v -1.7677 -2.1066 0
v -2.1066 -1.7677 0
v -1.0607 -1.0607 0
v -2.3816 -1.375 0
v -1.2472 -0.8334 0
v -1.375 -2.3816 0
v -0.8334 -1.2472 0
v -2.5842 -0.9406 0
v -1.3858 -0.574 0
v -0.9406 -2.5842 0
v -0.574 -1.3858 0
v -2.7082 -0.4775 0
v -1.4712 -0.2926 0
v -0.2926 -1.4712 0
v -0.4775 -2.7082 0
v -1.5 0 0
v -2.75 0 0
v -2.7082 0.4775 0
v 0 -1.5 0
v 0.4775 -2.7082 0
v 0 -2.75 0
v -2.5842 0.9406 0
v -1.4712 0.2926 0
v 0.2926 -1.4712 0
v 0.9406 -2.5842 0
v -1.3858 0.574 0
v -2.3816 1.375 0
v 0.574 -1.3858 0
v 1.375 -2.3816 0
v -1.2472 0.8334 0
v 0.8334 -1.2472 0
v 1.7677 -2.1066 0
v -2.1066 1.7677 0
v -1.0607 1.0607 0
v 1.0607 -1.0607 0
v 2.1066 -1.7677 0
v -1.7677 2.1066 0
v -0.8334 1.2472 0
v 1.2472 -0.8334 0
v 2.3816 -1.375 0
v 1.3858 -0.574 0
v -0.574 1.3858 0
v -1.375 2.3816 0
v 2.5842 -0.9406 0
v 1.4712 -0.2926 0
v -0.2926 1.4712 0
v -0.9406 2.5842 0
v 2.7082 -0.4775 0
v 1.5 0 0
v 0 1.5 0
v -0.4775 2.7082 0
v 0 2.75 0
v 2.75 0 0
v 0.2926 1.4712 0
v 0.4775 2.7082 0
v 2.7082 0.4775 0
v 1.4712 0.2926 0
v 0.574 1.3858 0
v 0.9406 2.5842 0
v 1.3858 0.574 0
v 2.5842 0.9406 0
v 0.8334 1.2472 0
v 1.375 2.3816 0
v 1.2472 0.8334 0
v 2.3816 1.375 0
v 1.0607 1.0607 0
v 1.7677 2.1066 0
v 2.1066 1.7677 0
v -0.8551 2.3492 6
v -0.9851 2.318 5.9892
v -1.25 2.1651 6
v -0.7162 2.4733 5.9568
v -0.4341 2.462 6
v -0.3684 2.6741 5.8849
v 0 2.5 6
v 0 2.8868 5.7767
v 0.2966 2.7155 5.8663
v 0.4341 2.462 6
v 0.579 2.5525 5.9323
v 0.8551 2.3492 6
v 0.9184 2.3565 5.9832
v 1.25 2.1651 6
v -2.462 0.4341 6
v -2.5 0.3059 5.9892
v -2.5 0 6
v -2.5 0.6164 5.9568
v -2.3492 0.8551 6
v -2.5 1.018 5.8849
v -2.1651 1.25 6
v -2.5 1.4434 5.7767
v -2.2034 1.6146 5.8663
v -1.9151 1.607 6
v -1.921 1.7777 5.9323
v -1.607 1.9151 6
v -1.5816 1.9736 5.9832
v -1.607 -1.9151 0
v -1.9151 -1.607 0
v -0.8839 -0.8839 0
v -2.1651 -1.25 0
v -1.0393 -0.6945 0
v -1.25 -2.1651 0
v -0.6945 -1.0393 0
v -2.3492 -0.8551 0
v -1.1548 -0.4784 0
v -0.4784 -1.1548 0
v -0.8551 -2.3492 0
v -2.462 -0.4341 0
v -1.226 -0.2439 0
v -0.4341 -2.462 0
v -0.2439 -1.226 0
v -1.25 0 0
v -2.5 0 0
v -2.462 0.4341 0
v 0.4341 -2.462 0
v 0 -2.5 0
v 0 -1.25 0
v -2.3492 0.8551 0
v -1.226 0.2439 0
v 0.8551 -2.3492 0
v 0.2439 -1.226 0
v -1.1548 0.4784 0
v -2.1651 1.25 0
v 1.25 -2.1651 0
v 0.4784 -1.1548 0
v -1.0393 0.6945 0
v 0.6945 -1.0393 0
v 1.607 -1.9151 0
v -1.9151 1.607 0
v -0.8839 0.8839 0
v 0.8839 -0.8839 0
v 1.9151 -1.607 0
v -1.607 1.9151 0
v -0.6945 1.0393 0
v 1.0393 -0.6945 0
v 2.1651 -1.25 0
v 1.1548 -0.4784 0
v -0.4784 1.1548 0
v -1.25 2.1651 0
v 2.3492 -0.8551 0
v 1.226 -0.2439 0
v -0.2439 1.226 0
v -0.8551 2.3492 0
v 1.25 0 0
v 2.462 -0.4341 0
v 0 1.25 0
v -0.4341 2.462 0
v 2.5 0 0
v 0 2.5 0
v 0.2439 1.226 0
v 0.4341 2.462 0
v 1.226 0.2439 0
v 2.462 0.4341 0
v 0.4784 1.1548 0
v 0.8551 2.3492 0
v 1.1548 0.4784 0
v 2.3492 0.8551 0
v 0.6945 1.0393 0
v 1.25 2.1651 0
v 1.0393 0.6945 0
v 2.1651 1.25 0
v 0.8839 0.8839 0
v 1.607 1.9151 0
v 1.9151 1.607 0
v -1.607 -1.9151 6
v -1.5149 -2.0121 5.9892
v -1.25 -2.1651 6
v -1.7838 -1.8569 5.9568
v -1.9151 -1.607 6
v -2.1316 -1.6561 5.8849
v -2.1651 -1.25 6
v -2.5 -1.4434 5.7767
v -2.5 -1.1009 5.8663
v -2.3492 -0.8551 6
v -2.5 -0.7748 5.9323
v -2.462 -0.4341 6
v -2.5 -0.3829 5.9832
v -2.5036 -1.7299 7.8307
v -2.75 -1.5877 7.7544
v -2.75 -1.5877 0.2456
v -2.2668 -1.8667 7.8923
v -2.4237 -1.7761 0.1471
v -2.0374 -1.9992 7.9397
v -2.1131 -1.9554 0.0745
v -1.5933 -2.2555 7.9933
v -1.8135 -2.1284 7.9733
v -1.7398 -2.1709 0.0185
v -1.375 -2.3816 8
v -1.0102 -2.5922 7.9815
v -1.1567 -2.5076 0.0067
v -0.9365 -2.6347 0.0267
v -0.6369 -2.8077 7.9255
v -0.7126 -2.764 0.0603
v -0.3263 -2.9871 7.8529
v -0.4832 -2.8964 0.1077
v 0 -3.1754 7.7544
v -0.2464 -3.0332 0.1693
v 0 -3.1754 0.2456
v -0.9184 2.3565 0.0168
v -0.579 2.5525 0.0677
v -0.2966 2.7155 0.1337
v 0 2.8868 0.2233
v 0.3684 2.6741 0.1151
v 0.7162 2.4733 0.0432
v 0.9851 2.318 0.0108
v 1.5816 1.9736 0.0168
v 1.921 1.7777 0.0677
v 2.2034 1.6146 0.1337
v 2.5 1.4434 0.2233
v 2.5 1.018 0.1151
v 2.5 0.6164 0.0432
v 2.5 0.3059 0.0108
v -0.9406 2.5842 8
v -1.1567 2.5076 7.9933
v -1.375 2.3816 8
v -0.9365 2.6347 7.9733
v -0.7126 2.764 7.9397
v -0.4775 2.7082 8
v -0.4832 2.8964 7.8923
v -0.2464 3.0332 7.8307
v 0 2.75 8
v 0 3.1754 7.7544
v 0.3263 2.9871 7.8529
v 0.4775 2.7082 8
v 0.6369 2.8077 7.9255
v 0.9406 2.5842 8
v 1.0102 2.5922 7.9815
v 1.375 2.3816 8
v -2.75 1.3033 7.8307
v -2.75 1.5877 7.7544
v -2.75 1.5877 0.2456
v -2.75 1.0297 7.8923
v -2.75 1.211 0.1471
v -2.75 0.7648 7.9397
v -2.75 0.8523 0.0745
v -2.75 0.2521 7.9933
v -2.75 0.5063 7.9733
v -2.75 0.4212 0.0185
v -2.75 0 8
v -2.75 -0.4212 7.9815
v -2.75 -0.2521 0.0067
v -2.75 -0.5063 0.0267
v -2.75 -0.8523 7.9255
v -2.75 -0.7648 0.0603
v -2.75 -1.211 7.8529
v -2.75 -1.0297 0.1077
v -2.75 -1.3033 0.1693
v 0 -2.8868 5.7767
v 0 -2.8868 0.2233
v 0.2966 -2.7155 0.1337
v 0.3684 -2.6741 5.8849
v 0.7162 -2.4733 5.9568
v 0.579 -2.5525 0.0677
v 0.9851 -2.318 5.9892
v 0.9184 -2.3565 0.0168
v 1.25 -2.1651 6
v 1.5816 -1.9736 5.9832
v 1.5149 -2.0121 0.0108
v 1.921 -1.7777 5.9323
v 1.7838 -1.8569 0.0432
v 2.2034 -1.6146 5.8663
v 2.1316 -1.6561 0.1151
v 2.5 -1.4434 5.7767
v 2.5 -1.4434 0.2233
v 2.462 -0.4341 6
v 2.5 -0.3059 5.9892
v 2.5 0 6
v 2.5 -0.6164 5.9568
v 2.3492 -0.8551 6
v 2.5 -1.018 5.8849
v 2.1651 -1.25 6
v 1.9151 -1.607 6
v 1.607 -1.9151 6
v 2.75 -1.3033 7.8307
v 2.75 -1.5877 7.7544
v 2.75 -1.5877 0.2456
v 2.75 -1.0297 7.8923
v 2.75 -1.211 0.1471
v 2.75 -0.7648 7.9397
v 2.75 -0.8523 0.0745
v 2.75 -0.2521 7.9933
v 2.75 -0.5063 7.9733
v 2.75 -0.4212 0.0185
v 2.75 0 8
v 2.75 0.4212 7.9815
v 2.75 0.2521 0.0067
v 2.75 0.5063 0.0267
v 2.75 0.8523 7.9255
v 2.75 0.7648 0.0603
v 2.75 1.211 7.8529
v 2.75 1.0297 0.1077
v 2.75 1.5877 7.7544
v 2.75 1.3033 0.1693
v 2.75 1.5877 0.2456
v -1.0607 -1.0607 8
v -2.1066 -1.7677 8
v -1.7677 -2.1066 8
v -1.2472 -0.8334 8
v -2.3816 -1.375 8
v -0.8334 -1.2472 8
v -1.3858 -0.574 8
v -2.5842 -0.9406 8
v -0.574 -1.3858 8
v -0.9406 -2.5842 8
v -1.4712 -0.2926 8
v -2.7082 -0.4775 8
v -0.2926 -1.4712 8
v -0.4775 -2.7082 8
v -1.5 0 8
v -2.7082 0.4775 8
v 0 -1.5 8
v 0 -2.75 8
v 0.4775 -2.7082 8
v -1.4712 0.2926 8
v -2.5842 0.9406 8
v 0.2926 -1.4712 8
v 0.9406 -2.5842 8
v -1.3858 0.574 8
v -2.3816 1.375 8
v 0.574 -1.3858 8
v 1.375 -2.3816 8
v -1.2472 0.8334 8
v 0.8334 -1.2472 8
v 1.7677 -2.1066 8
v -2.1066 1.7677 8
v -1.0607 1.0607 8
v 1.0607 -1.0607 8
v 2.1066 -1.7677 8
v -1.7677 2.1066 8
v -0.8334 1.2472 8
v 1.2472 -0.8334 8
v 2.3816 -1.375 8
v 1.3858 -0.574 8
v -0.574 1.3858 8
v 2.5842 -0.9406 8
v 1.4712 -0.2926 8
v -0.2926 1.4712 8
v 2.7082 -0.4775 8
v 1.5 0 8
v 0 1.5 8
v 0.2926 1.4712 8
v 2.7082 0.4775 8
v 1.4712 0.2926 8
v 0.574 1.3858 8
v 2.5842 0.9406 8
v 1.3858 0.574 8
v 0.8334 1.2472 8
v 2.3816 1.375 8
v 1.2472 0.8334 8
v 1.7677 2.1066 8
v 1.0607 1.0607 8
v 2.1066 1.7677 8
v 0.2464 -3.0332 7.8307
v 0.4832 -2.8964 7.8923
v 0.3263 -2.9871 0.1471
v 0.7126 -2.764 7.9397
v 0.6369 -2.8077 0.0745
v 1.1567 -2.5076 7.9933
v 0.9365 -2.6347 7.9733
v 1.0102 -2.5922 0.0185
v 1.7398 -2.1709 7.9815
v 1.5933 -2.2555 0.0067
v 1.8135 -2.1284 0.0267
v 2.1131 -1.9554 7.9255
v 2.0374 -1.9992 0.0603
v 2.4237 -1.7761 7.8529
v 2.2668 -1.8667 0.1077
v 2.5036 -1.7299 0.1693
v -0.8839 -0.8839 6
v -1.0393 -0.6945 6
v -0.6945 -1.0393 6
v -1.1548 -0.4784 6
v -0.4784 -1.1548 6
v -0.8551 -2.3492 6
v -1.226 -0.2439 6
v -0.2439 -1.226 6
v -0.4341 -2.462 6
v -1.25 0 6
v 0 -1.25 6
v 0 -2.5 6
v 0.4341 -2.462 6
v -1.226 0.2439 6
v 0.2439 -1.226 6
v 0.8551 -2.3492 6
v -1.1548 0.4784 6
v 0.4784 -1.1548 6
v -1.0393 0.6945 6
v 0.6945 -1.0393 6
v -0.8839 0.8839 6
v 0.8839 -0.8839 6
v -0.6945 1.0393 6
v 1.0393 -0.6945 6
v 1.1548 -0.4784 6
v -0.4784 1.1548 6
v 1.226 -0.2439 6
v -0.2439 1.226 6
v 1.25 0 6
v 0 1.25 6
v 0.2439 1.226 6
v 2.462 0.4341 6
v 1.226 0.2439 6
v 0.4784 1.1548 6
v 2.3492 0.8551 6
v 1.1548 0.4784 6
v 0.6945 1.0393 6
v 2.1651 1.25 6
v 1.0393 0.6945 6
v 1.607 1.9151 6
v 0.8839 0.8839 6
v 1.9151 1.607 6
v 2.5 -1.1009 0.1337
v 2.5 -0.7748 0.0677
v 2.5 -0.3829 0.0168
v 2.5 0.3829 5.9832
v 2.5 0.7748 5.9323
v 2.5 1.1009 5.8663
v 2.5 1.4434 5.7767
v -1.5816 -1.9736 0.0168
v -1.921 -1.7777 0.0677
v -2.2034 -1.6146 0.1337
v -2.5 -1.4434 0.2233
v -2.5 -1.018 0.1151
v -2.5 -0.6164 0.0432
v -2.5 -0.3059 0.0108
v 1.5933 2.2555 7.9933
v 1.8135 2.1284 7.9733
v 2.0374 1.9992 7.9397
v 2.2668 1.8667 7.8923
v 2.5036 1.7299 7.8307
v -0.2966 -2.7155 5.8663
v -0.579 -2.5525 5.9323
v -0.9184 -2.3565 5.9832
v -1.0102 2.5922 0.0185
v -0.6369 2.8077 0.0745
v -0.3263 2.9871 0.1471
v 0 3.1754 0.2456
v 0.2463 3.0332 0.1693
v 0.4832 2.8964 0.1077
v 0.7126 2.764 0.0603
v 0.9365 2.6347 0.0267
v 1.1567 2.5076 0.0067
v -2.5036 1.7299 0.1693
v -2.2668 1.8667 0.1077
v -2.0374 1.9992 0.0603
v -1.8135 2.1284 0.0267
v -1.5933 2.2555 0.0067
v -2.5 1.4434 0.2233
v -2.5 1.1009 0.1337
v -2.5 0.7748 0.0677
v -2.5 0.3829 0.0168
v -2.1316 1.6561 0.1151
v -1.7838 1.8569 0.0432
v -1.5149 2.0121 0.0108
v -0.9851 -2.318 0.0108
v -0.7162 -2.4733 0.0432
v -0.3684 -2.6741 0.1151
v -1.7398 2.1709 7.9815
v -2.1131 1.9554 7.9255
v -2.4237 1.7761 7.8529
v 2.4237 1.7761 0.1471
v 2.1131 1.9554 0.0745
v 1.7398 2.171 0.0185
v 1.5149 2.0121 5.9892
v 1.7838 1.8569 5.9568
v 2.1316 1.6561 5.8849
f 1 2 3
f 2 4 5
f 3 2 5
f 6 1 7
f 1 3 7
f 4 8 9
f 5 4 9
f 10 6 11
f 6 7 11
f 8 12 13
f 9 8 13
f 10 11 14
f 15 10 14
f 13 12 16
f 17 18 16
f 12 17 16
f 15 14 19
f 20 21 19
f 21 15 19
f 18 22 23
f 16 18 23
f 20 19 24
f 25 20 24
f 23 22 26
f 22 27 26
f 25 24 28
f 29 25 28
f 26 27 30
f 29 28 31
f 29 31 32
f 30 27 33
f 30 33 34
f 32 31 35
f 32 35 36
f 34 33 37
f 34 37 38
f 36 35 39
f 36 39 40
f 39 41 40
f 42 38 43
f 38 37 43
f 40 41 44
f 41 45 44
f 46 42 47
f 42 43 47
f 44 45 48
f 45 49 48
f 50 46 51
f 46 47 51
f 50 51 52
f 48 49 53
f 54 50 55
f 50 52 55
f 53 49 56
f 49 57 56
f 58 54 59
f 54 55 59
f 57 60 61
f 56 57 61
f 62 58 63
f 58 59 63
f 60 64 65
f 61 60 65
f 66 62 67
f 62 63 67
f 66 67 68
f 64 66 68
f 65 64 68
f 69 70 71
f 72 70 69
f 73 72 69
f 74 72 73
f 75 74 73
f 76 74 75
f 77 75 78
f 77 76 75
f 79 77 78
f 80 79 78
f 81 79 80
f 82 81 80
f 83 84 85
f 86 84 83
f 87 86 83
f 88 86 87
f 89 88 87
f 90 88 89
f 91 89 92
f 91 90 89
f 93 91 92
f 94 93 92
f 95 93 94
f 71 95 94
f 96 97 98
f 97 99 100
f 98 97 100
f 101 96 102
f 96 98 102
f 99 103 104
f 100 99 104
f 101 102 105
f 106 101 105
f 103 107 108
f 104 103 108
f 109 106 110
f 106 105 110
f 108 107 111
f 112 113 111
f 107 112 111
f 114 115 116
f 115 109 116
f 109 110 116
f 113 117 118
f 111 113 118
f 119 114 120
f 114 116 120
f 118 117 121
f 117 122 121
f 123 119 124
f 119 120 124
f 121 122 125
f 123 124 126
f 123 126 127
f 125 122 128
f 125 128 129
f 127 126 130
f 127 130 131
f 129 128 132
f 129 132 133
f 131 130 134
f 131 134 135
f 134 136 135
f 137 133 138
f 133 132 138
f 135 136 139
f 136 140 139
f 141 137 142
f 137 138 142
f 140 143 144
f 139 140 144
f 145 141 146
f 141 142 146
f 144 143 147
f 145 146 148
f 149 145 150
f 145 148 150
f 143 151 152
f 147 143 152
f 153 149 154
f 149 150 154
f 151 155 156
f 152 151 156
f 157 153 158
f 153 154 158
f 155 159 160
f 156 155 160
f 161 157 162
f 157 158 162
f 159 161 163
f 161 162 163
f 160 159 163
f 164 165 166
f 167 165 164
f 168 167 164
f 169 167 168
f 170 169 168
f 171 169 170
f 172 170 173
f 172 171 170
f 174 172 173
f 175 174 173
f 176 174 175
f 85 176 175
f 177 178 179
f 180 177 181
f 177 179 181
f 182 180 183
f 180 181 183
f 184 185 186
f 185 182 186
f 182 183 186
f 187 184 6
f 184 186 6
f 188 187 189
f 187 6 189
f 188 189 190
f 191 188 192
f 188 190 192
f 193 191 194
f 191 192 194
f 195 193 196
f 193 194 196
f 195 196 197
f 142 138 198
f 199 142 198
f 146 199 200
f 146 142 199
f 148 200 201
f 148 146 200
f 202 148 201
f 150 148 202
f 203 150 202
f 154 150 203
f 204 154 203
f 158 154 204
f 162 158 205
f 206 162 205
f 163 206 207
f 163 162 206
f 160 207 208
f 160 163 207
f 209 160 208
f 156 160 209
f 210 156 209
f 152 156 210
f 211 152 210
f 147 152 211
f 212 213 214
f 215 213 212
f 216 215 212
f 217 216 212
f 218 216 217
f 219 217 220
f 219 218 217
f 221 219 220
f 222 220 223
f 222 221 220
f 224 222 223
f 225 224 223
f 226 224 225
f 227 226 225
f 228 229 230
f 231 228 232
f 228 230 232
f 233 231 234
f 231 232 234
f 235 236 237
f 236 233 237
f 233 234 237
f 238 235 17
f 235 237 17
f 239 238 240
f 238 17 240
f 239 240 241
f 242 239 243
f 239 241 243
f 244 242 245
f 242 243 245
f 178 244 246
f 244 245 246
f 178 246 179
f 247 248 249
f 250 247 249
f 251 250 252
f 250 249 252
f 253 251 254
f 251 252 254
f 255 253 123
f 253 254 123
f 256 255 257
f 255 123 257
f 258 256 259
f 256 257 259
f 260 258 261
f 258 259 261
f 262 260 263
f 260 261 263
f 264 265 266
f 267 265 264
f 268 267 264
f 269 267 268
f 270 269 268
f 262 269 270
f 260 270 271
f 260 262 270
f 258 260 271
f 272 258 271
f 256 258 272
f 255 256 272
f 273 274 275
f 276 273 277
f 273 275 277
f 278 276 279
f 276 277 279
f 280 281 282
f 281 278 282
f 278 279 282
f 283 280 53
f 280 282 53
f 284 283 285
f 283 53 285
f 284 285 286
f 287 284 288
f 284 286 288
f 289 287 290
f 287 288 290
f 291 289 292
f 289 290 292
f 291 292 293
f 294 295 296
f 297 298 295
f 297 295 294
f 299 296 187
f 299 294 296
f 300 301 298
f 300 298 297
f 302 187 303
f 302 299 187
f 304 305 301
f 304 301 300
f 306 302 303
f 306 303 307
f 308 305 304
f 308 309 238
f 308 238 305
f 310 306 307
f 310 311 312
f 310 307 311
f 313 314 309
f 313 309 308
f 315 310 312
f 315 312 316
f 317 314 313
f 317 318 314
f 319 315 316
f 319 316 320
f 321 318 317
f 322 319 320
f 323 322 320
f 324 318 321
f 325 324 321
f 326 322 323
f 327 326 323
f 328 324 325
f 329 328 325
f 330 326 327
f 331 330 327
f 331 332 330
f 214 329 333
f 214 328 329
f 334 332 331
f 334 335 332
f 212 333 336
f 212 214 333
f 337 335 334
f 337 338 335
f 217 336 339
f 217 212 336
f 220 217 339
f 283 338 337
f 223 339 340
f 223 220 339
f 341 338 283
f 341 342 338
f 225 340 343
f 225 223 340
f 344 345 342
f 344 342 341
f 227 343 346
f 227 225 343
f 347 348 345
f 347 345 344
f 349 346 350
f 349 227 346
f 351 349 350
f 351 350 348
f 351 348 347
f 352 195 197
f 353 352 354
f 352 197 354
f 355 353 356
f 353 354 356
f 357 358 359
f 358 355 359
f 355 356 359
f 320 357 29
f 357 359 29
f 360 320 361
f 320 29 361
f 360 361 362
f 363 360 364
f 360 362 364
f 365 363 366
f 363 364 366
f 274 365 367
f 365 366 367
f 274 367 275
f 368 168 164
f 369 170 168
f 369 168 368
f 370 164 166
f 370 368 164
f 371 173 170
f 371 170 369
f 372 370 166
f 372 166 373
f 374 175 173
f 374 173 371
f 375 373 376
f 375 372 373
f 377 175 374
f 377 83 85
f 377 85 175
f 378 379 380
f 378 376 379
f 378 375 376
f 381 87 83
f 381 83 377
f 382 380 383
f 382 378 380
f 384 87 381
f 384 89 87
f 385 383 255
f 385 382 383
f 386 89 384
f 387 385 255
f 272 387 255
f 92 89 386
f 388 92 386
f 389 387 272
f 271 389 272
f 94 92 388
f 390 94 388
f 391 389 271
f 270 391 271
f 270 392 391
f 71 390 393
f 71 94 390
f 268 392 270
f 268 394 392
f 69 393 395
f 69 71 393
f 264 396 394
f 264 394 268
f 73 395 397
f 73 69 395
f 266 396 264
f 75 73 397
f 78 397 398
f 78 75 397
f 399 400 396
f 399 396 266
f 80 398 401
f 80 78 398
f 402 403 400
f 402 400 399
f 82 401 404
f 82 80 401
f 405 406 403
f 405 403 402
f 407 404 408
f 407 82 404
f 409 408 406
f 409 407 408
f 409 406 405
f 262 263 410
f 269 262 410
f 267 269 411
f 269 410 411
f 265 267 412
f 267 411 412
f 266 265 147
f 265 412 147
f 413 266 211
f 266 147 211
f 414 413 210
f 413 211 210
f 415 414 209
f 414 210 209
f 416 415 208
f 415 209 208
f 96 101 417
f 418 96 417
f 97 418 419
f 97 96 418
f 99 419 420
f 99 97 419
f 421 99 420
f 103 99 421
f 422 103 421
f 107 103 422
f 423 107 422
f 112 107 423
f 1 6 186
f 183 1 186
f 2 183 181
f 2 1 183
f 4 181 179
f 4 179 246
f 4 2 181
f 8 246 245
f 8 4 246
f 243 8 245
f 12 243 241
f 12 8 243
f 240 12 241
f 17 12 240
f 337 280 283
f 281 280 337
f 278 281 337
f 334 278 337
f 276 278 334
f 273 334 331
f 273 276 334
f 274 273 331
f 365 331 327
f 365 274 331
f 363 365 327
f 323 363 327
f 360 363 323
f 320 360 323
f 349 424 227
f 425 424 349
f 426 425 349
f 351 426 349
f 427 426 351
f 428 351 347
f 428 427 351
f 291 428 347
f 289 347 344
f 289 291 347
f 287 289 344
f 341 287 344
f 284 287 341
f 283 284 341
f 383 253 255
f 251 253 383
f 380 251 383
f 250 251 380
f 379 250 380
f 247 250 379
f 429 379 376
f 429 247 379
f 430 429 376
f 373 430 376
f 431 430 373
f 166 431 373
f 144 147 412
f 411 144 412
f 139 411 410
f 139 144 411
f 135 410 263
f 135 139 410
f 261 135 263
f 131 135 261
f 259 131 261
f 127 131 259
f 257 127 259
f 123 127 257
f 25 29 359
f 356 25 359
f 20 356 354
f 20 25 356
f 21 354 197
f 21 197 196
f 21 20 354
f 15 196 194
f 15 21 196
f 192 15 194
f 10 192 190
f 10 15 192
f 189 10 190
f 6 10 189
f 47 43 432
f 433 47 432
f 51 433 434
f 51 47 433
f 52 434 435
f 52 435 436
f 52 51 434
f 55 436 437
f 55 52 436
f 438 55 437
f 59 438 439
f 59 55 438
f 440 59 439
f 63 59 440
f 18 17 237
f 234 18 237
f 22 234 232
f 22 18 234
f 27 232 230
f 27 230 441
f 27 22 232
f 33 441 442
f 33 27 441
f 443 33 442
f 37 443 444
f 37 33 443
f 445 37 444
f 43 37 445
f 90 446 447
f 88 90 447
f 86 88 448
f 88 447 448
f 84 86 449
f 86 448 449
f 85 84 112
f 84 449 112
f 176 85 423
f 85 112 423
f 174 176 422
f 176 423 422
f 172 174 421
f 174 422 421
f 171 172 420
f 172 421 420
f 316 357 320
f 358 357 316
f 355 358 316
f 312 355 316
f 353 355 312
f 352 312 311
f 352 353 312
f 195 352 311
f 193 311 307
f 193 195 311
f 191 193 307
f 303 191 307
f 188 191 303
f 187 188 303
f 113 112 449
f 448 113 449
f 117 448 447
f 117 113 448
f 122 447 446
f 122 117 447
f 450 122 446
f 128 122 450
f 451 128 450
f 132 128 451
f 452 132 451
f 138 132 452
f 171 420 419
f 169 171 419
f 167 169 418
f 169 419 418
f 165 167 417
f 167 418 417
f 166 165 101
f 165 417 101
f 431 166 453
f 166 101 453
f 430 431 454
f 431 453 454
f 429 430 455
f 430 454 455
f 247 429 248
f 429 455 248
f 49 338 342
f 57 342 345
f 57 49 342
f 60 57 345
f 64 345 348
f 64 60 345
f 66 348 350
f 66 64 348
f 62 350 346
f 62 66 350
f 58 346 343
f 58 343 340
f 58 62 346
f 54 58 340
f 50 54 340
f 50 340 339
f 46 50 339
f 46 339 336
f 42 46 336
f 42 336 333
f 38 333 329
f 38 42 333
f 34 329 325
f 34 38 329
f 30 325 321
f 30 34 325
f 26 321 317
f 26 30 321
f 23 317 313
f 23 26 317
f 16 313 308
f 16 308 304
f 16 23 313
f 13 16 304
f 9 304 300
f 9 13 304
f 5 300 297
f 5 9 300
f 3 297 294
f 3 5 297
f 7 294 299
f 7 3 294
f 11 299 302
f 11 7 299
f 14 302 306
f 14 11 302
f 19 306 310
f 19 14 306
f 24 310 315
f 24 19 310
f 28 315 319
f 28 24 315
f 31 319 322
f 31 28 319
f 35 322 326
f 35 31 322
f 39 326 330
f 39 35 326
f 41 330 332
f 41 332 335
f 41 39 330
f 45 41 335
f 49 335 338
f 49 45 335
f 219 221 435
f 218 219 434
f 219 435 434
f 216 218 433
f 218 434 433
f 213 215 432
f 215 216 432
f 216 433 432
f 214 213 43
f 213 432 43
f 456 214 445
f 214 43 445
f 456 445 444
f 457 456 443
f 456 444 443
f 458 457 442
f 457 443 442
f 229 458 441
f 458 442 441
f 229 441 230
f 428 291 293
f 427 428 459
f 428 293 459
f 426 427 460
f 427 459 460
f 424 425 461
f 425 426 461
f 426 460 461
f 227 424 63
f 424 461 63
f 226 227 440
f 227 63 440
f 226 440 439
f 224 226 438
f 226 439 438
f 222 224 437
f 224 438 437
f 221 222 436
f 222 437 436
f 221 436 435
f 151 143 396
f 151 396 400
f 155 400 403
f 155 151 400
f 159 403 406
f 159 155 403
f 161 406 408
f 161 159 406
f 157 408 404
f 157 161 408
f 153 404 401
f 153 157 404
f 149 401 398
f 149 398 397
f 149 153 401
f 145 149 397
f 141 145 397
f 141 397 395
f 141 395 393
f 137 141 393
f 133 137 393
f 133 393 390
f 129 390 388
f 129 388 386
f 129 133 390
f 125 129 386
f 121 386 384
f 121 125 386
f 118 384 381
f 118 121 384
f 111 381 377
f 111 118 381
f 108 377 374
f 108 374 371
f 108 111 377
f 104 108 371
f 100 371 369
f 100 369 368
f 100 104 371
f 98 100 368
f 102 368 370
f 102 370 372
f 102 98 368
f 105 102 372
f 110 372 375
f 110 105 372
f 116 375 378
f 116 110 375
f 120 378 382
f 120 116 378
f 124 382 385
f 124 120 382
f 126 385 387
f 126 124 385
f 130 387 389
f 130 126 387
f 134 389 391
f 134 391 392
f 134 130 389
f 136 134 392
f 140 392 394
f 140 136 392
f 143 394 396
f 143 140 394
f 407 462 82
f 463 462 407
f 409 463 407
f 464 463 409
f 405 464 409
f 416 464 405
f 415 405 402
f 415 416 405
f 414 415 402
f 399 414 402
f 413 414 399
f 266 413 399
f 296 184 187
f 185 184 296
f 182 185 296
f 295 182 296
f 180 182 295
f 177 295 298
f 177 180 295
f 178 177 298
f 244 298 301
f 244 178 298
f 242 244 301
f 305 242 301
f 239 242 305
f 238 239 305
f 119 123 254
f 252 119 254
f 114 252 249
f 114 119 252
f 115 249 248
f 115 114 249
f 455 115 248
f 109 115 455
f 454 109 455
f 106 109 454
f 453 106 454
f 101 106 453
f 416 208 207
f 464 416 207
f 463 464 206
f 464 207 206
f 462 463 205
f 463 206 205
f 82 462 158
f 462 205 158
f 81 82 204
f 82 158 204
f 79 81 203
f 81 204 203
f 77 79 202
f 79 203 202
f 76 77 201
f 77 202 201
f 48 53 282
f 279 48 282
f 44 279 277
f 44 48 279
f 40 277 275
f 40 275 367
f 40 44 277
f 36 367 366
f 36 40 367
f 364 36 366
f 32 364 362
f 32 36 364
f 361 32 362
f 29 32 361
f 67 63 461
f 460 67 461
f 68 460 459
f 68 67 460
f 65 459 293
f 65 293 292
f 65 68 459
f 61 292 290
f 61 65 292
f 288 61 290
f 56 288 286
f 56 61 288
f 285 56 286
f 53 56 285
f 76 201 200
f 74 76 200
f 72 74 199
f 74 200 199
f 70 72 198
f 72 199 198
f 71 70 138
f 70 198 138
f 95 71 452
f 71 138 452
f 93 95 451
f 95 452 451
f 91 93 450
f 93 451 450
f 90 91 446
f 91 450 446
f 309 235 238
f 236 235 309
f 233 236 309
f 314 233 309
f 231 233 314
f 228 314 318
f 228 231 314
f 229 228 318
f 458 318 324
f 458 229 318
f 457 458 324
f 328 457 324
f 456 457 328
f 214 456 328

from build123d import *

# Parameters (mm, degrees)
F1_R     = 1.5
F2_DEPTH = 8
F5_R     = 1.25
F6_DEPTH = 6


with BuildPart() as f2:
    # F1 (on Top) → F2 (new body)
    with BuildSketch(Plane.XY):
        Polygon((2.75, 1.5877132403), (0, 3.1754264805), (-2.75, 1.5877132403), (-2.75, -1.5877132403), (0, -3.1754264805), (2.75, -1.5877132403), align=None)
        Circle(F1_R, mode=Mode.SUBTRACT)
    extrude(amount=F2_DEPTH)

    # F3 (on Front) → F4 (revolve, cut)
    with BuildSketch(Plane.XZ):
        Polygon((5.4806887836, 8), (2.75, 8), (5.4806887836, 6.4234360957), align=None)
        Polygon((5.4806887836, 1.5765639043), (2.75, 0), (5.4806887836, 0), align=None)
    revolve(axis=Axis((0, 0, 4), (0, 0, -1)), mode=Mode.SUBTRACT)


with BuildPart() as f6:
    # F5 (on Top) → F6 (new body)
    with BuildSketch(Plane.XY):
        Polygon((0, -2.8867513459), (2.5, -1.443375673), (2.5, 1.443375673), (0, 2.8867513459), (-2.5, 1.443375673), (-2.5, -1.443375673), align=None)
        Circle(F5_R, mode=Mode.SUBTRACT)
    extrude(amount=F6_DEPTH)

    # F7 (on Front) → F8 (revolve, cut)
    with BuildSketch(Plane.XZ):
        Polygon((4.3954963651, 6), (2.5, 6), (4.3954963651, 4.9056346634), align=None)
        Polygon((2.5, 0), (4.3954963651, 0), (4.3954963651, 1.0943653366), align=None)
    revolve(axis=Axis((0, 0, 3), (0, 0, -1)), mode=Mode.SUBTRACT)


solid = Compound([f2.part, f6.part])
